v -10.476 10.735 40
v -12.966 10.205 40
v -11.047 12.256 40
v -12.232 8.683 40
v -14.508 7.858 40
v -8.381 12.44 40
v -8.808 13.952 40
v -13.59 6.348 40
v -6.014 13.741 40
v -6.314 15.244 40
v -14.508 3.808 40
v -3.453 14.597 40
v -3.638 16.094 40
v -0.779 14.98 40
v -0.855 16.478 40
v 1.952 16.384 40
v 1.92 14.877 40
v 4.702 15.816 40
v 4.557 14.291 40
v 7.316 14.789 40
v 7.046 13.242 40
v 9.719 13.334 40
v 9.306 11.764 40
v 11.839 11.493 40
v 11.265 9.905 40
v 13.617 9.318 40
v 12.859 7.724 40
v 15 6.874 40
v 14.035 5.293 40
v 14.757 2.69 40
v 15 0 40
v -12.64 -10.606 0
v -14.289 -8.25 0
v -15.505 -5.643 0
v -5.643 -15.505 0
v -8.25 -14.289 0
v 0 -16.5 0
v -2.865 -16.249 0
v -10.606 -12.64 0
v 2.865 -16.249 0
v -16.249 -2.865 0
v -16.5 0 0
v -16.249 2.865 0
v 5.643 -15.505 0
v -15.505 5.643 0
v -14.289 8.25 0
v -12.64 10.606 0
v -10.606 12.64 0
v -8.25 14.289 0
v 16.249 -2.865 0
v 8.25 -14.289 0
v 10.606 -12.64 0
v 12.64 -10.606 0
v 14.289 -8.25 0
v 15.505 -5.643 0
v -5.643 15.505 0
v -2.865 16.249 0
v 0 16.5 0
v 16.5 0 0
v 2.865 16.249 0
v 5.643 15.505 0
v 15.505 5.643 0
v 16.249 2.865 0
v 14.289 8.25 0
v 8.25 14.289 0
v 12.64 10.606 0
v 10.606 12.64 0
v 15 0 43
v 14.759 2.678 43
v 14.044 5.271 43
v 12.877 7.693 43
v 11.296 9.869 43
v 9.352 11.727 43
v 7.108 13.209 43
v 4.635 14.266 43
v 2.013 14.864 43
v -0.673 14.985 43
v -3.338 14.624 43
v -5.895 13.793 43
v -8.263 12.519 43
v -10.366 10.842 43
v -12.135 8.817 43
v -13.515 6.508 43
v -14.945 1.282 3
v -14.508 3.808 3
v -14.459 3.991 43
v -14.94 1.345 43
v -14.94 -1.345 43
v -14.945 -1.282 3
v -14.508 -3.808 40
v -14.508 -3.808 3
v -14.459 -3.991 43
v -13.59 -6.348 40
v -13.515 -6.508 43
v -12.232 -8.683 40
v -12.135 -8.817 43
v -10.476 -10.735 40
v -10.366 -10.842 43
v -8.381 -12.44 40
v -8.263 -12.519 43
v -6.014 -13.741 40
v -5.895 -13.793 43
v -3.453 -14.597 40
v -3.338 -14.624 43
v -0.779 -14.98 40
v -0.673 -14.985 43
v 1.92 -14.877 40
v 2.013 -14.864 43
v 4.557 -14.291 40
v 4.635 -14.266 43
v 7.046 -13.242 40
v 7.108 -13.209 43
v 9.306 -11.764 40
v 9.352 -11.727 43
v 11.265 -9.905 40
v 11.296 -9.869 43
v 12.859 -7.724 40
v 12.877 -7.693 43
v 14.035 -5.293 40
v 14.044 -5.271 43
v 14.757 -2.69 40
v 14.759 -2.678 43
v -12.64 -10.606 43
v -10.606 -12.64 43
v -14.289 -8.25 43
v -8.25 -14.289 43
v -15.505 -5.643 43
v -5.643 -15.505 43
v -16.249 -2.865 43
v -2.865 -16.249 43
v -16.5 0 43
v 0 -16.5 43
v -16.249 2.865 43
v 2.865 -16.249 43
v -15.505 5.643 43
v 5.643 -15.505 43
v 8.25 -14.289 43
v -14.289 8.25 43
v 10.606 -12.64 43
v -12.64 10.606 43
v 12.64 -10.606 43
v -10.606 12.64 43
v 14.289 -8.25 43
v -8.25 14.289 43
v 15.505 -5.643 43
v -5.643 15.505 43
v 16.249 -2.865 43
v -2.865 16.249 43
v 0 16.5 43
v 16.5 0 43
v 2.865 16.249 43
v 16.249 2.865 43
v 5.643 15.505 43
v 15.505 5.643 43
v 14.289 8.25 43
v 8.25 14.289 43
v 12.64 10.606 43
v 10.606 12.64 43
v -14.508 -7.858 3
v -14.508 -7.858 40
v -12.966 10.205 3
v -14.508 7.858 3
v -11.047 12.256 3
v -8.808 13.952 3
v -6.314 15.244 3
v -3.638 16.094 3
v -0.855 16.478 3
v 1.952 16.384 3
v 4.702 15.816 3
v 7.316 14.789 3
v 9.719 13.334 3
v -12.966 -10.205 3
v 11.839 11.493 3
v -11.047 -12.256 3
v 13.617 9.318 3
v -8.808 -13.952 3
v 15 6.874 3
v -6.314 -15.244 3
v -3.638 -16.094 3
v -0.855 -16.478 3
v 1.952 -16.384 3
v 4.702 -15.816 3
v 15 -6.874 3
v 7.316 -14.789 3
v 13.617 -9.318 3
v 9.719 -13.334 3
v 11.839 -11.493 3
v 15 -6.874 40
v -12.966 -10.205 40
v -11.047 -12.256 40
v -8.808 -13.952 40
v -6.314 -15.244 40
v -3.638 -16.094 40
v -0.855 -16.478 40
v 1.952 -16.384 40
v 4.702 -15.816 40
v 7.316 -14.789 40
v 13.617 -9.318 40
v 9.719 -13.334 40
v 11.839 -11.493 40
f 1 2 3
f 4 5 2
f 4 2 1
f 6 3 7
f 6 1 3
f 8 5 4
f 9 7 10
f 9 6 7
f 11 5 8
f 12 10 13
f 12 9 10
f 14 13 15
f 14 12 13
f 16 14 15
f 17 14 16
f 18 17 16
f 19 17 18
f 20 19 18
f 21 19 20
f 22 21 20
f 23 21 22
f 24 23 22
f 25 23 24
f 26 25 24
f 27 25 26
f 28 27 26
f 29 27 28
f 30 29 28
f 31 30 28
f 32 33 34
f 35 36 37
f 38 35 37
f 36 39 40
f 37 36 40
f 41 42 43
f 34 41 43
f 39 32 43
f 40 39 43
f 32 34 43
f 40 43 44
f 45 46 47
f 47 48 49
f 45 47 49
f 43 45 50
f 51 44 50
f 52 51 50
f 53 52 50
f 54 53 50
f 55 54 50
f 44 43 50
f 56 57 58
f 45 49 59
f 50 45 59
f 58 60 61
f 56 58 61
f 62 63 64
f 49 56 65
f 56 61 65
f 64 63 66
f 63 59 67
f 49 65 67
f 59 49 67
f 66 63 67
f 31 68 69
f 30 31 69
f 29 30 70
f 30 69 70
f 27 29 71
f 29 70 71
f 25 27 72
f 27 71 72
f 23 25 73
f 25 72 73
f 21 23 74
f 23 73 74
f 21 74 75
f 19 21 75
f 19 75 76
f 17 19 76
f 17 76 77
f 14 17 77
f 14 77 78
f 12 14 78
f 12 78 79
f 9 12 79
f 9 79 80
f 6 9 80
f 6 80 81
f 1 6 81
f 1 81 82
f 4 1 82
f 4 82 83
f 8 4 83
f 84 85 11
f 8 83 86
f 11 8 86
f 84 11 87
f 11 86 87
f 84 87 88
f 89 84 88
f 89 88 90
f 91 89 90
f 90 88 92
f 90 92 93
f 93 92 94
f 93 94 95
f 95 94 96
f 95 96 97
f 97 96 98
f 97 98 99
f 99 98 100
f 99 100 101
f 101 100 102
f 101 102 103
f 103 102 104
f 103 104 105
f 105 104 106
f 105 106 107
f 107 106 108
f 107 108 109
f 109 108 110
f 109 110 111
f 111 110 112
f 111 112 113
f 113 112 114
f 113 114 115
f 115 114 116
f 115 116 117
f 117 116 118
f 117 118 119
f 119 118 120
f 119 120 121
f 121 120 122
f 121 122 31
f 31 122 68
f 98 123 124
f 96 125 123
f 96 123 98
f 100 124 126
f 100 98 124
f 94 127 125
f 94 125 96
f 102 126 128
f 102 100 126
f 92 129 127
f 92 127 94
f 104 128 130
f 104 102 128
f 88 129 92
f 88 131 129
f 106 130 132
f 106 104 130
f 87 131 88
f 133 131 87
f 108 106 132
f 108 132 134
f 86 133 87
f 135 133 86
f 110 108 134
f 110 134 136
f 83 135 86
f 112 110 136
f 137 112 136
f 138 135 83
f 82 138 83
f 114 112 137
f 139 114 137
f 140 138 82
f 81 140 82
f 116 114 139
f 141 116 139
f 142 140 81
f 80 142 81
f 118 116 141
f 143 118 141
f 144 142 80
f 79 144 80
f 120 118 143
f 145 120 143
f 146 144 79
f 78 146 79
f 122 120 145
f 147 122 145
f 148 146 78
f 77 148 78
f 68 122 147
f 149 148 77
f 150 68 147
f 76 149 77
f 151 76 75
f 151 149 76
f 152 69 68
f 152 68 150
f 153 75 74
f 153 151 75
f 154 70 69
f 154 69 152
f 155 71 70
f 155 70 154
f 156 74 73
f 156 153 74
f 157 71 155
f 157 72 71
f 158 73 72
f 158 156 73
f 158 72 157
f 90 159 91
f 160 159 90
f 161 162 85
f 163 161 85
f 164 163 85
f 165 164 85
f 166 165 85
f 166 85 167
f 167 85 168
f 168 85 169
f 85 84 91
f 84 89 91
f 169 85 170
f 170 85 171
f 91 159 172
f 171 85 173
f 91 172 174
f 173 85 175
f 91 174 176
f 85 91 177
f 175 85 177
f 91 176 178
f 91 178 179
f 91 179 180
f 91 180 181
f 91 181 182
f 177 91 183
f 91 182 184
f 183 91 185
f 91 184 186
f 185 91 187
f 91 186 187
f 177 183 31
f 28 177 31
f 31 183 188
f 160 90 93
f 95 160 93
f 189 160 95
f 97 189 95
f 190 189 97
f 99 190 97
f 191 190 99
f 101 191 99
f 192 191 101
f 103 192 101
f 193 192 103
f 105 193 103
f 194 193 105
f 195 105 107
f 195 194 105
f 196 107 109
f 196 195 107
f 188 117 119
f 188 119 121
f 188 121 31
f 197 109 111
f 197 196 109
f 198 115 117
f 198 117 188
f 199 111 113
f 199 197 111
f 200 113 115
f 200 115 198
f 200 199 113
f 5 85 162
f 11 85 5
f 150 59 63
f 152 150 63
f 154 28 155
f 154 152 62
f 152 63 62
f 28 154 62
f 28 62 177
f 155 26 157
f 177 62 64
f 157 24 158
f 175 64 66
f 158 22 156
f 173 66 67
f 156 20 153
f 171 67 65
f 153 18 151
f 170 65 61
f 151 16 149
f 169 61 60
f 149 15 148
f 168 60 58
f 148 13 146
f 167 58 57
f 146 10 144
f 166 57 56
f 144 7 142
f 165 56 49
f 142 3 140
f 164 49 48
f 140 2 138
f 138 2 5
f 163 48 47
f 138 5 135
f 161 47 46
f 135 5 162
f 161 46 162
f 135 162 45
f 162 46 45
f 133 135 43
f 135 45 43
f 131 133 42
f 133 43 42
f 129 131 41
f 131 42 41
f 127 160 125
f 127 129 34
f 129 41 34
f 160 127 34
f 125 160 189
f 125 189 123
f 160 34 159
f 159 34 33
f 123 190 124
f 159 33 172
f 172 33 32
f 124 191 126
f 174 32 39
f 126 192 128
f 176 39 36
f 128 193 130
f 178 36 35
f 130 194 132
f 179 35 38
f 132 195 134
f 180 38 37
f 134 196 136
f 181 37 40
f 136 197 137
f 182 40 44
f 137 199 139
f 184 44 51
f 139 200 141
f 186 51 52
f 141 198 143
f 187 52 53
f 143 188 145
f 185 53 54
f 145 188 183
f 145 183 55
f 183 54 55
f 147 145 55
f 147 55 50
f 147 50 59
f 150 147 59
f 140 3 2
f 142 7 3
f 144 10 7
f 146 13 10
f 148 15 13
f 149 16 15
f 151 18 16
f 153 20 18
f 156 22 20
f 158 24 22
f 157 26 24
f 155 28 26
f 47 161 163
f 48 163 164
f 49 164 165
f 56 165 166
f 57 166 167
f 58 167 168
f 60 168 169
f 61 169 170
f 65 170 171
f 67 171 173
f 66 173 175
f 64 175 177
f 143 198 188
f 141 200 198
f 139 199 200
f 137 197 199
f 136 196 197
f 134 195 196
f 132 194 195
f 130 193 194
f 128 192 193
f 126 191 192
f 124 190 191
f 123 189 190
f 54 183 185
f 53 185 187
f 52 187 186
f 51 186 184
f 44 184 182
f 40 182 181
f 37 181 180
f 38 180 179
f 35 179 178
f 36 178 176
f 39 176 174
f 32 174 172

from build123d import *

# Parameters (mm, degrees)
F0_R     = 16.5
F1_DEPTH = 43
F2_R     = 15
F3_DEPTH = 40
F5_W     = 29.508476
F5_H     = 37
F6_DEPTH = 66.501


with BuildPart() as f1:
    # F0 (on Top) → F1 (new body)
    with BuildSketch(Plane.XY):
        Circle(F0_R)
    extrude(amount=F1_DEPTH)

    # F2 (on face) → F3 (cut)
    with BuildSketch(Plane.XY.offset(43)):
        Circle(F2_R)
    extrude(amount=-F3_DEPTH, mode=Mode.SUBTRACT)

    # F5 (on offset) → F6 (cut, through all)
    with BuildSketch(Plane.XZ.offset(50)):
        with Locations((0.245762, 21.5)):
            Rectangle(F5_W, F5_H)
    extrude(amount=-F6_DEPTH, mode=Mode.SUBTRACT)


solid = f1.part
